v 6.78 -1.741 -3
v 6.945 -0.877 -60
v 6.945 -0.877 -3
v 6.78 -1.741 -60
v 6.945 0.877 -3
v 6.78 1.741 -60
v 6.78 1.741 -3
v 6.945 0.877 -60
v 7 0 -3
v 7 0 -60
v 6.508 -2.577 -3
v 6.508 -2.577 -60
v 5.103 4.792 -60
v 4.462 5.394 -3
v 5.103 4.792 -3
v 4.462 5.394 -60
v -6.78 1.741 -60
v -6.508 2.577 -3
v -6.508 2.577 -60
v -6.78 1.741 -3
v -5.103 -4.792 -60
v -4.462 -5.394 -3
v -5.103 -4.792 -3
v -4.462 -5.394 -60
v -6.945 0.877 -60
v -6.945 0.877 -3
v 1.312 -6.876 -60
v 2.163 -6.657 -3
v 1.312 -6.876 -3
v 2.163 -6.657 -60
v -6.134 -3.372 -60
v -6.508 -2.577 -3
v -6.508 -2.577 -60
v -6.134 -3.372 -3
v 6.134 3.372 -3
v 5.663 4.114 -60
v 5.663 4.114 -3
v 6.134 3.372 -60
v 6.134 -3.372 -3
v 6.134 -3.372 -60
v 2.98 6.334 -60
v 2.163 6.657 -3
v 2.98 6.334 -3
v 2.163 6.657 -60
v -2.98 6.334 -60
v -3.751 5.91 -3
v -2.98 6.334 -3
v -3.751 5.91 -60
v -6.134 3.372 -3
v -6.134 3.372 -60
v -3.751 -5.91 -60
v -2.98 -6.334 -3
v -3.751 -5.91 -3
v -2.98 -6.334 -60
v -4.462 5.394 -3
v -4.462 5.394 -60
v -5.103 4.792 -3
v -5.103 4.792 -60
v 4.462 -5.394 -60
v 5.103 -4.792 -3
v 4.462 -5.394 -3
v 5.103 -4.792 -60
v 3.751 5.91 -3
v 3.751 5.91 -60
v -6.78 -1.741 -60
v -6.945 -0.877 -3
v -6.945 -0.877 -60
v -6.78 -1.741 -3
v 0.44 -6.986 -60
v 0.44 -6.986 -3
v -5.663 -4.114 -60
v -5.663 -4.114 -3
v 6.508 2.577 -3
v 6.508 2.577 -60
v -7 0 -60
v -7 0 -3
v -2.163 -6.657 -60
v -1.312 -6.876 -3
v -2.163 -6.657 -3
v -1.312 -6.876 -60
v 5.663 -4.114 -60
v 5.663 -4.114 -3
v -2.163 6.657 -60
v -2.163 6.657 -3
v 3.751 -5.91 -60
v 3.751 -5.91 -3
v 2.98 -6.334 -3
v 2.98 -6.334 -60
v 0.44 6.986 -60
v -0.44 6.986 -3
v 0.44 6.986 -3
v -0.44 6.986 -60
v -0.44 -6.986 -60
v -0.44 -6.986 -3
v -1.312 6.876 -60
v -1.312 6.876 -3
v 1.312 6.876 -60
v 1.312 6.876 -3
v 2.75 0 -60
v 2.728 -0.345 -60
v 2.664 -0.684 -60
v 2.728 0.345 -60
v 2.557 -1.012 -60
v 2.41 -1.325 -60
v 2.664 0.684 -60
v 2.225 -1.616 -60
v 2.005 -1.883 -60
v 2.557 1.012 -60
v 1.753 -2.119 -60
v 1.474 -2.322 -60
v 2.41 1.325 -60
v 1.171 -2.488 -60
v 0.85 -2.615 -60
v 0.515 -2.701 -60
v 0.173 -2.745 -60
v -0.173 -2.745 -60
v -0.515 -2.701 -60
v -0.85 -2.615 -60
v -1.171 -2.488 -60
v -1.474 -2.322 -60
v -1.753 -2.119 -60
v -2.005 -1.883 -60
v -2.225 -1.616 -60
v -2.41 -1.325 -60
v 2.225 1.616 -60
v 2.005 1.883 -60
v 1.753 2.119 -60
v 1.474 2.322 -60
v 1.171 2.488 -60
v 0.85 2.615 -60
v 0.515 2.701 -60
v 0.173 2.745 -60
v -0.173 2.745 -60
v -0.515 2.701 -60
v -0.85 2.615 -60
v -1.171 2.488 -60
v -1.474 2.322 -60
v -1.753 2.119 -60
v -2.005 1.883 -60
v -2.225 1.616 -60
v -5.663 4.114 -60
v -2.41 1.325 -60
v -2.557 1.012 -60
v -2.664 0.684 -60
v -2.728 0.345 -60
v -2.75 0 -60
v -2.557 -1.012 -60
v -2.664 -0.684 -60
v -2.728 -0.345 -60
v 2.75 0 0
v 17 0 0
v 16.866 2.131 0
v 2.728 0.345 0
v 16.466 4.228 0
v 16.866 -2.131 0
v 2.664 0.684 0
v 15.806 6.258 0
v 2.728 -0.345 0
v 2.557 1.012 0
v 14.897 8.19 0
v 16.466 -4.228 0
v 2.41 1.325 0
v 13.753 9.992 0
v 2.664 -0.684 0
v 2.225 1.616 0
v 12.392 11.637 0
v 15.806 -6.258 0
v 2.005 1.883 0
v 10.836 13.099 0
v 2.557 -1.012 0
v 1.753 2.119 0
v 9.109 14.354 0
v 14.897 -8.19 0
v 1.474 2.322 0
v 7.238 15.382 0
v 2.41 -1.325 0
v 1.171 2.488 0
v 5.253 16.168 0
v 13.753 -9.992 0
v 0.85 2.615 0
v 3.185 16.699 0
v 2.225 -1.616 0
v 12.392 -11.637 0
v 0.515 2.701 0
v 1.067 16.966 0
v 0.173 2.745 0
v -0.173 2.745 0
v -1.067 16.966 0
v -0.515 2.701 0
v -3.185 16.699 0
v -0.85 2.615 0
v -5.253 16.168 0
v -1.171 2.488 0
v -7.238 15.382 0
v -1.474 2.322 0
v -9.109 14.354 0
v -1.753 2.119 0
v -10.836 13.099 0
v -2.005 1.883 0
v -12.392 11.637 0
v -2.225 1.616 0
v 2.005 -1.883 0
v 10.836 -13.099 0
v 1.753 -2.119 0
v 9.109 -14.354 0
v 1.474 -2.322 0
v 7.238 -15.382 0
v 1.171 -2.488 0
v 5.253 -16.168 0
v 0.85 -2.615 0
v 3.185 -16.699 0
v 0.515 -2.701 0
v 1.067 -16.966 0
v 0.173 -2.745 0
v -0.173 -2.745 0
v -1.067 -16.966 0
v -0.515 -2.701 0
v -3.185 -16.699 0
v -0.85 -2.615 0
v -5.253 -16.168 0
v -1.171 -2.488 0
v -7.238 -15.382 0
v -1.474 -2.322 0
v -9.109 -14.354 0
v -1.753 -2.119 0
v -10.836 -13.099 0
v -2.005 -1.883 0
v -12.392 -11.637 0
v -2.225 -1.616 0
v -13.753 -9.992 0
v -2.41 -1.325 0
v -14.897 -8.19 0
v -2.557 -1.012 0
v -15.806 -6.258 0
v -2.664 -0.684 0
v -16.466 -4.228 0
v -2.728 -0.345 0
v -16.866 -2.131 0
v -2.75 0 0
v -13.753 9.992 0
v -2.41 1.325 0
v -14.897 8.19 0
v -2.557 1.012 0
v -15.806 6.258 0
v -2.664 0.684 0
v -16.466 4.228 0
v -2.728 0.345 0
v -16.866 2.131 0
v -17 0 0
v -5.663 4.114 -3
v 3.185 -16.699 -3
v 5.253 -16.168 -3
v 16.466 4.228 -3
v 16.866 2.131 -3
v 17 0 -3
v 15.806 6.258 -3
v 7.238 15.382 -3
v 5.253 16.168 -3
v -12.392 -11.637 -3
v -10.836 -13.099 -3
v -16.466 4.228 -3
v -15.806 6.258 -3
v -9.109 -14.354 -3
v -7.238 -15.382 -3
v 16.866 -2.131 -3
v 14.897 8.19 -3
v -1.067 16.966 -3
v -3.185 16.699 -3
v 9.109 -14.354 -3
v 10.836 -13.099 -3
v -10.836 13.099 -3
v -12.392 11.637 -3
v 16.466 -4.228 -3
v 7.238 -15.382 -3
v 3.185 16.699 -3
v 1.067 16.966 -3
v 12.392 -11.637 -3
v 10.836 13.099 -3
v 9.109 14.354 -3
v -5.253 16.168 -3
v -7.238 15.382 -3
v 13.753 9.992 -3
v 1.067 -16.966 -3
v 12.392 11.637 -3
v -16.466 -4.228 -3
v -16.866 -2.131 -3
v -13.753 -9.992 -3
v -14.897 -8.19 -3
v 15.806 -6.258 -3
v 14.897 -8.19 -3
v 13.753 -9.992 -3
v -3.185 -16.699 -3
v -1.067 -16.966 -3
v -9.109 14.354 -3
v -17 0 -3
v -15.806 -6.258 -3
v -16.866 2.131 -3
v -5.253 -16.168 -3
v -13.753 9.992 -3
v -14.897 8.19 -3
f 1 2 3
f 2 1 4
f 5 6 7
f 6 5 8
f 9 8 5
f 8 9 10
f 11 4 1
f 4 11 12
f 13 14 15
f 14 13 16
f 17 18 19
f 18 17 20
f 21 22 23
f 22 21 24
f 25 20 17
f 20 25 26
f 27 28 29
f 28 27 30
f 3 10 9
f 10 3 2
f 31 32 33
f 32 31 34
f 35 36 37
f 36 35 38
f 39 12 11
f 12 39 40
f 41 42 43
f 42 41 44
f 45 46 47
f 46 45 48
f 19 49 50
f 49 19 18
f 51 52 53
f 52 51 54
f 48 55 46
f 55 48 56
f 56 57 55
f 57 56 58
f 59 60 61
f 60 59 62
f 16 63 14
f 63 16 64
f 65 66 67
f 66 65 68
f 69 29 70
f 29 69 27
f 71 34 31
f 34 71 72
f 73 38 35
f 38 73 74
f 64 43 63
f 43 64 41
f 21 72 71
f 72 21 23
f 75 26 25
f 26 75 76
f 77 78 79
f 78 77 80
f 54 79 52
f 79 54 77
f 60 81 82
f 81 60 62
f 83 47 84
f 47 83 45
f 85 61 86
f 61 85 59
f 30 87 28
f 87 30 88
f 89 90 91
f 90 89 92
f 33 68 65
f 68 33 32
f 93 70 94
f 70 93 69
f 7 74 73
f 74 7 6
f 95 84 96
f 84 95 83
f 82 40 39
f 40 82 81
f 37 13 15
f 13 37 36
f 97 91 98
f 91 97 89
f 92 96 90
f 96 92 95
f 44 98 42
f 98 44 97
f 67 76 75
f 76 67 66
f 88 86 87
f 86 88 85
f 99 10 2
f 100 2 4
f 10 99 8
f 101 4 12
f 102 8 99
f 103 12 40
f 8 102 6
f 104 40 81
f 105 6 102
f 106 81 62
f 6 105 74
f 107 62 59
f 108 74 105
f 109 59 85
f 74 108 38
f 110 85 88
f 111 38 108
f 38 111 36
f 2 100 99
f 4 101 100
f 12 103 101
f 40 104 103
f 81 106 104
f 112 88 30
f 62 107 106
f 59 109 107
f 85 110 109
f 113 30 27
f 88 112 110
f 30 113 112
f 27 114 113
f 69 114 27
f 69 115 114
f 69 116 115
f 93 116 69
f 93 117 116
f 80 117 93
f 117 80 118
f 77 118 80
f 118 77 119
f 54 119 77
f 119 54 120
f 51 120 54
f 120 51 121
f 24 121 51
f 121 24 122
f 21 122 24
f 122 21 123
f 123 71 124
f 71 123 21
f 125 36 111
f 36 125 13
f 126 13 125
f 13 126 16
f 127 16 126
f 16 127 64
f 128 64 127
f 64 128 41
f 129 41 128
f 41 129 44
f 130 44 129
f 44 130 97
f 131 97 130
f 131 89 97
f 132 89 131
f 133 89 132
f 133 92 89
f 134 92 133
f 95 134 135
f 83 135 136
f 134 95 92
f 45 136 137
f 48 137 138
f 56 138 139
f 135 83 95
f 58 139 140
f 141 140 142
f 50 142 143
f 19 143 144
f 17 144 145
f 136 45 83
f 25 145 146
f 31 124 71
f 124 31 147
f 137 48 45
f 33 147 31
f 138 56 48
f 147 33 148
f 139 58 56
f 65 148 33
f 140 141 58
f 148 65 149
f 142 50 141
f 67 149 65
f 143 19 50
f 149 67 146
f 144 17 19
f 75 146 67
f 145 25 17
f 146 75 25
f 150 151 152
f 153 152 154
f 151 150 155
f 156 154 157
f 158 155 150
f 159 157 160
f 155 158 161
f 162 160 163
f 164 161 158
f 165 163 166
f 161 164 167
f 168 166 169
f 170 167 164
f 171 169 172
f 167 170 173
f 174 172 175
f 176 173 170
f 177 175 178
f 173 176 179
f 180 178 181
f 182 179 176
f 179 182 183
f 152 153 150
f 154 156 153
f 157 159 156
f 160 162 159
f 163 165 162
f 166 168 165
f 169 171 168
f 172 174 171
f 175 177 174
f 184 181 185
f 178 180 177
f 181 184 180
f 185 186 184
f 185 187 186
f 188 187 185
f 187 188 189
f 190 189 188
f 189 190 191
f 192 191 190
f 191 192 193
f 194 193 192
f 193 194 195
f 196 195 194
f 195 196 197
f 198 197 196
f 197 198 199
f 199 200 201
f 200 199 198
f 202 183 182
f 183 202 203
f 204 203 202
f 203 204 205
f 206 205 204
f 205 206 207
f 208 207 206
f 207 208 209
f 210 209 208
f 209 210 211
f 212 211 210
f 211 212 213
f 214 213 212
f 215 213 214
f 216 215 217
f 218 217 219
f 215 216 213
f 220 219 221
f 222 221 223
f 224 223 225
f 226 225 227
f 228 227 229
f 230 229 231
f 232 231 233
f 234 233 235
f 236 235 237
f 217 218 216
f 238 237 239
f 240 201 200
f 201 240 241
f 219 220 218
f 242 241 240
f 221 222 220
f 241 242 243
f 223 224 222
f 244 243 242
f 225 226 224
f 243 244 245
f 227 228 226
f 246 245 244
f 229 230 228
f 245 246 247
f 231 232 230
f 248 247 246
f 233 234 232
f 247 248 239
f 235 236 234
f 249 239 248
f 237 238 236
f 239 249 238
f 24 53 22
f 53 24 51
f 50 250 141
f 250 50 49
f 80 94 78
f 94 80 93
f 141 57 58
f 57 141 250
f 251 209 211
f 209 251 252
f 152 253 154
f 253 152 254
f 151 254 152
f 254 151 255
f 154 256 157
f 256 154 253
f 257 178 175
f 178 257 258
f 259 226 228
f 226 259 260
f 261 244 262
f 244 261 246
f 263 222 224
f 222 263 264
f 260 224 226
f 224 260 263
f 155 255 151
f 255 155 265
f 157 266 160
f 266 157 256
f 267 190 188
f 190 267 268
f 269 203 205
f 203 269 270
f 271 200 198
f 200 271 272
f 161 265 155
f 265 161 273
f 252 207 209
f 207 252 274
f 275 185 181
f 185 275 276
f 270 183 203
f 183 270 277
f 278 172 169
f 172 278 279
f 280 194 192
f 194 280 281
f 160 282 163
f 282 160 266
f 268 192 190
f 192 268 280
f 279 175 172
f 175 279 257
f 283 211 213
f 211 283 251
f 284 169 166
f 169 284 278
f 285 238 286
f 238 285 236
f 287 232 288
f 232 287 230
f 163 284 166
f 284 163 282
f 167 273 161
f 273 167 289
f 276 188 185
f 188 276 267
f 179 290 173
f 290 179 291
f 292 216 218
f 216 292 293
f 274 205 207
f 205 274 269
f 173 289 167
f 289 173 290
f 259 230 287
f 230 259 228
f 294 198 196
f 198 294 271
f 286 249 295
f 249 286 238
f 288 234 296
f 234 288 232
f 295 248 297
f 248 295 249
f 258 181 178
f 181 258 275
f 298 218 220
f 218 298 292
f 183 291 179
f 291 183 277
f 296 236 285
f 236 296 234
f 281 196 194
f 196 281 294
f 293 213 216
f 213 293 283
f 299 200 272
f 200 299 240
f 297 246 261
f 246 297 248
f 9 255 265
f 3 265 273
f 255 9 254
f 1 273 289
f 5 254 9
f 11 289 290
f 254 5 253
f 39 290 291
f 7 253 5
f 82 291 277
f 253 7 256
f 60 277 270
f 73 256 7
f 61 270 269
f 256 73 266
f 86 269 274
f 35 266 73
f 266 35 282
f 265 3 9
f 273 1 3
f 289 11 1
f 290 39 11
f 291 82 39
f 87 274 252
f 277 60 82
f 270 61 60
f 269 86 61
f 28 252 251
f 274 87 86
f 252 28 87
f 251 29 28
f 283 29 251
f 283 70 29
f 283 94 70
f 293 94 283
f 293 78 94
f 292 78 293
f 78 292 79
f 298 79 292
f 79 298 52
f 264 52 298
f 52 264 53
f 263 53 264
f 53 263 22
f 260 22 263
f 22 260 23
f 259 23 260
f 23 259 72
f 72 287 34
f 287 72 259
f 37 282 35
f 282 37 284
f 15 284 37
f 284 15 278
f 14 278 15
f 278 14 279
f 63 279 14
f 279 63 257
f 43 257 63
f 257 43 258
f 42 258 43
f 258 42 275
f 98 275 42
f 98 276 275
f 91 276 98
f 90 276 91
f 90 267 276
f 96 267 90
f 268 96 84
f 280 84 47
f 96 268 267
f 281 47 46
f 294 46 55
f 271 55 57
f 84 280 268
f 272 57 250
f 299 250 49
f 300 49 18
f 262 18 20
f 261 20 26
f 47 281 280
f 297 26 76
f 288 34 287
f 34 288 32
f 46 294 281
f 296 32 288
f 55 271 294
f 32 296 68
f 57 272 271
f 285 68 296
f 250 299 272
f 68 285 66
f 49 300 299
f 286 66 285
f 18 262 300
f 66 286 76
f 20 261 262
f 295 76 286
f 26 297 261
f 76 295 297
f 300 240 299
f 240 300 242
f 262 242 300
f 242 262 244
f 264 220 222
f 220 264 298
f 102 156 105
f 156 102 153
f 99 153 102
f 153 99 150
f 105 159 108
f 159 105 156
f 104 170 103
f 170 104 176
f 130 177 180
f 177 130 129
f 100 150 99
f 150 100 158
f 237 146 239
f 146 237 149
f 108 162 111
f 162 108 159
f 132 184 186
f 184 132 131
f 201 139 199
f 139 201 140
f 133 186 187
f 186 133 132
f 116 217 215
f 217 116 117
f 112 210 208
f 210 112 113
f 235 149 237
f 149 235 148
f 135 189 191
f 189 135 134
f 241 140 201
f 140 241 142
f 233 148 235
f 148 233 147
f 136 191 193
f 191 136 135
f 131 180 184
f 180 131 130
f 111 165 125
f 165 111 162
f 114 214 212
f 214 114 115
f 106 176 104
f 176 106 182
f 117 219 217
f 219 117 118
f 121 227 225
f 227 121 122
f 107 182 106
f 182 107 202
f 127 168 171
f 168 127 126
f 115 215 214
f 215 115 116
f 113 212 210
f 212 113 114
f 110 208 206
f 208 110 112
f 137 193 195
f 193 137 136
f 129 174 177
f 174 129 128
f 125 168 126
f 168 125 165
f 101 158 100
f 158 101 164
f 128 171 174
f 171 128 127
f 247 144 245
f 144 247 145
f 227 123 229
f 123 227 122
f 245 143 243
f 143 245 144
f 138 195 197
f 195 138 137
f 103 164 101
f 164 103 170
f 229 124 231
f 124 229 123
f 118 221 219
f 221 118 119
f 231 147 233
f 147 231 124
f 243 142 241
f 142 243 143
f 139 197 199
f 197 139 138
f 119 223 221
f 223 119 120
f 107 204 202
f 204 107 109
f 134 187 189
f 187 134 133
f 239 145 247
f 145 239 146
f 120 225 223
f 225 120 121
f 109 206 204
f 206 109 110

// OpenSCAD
$fn = 50;


difference() {
	union() {
		translate(v = [0, 0, -60.0000000000]) {
			cylinder(h = 60, r = 7.0000000000);
		}
		translate(v = [0, 0, -3.0000000000]) {
			cylinder(h = 3, r = 17.0000000000);
		}
	}
	union() {
		#translate(v = [0, 0, -60]) {
			cylinder(h = 60, r = 2.7500000000);
		}
	}
}
